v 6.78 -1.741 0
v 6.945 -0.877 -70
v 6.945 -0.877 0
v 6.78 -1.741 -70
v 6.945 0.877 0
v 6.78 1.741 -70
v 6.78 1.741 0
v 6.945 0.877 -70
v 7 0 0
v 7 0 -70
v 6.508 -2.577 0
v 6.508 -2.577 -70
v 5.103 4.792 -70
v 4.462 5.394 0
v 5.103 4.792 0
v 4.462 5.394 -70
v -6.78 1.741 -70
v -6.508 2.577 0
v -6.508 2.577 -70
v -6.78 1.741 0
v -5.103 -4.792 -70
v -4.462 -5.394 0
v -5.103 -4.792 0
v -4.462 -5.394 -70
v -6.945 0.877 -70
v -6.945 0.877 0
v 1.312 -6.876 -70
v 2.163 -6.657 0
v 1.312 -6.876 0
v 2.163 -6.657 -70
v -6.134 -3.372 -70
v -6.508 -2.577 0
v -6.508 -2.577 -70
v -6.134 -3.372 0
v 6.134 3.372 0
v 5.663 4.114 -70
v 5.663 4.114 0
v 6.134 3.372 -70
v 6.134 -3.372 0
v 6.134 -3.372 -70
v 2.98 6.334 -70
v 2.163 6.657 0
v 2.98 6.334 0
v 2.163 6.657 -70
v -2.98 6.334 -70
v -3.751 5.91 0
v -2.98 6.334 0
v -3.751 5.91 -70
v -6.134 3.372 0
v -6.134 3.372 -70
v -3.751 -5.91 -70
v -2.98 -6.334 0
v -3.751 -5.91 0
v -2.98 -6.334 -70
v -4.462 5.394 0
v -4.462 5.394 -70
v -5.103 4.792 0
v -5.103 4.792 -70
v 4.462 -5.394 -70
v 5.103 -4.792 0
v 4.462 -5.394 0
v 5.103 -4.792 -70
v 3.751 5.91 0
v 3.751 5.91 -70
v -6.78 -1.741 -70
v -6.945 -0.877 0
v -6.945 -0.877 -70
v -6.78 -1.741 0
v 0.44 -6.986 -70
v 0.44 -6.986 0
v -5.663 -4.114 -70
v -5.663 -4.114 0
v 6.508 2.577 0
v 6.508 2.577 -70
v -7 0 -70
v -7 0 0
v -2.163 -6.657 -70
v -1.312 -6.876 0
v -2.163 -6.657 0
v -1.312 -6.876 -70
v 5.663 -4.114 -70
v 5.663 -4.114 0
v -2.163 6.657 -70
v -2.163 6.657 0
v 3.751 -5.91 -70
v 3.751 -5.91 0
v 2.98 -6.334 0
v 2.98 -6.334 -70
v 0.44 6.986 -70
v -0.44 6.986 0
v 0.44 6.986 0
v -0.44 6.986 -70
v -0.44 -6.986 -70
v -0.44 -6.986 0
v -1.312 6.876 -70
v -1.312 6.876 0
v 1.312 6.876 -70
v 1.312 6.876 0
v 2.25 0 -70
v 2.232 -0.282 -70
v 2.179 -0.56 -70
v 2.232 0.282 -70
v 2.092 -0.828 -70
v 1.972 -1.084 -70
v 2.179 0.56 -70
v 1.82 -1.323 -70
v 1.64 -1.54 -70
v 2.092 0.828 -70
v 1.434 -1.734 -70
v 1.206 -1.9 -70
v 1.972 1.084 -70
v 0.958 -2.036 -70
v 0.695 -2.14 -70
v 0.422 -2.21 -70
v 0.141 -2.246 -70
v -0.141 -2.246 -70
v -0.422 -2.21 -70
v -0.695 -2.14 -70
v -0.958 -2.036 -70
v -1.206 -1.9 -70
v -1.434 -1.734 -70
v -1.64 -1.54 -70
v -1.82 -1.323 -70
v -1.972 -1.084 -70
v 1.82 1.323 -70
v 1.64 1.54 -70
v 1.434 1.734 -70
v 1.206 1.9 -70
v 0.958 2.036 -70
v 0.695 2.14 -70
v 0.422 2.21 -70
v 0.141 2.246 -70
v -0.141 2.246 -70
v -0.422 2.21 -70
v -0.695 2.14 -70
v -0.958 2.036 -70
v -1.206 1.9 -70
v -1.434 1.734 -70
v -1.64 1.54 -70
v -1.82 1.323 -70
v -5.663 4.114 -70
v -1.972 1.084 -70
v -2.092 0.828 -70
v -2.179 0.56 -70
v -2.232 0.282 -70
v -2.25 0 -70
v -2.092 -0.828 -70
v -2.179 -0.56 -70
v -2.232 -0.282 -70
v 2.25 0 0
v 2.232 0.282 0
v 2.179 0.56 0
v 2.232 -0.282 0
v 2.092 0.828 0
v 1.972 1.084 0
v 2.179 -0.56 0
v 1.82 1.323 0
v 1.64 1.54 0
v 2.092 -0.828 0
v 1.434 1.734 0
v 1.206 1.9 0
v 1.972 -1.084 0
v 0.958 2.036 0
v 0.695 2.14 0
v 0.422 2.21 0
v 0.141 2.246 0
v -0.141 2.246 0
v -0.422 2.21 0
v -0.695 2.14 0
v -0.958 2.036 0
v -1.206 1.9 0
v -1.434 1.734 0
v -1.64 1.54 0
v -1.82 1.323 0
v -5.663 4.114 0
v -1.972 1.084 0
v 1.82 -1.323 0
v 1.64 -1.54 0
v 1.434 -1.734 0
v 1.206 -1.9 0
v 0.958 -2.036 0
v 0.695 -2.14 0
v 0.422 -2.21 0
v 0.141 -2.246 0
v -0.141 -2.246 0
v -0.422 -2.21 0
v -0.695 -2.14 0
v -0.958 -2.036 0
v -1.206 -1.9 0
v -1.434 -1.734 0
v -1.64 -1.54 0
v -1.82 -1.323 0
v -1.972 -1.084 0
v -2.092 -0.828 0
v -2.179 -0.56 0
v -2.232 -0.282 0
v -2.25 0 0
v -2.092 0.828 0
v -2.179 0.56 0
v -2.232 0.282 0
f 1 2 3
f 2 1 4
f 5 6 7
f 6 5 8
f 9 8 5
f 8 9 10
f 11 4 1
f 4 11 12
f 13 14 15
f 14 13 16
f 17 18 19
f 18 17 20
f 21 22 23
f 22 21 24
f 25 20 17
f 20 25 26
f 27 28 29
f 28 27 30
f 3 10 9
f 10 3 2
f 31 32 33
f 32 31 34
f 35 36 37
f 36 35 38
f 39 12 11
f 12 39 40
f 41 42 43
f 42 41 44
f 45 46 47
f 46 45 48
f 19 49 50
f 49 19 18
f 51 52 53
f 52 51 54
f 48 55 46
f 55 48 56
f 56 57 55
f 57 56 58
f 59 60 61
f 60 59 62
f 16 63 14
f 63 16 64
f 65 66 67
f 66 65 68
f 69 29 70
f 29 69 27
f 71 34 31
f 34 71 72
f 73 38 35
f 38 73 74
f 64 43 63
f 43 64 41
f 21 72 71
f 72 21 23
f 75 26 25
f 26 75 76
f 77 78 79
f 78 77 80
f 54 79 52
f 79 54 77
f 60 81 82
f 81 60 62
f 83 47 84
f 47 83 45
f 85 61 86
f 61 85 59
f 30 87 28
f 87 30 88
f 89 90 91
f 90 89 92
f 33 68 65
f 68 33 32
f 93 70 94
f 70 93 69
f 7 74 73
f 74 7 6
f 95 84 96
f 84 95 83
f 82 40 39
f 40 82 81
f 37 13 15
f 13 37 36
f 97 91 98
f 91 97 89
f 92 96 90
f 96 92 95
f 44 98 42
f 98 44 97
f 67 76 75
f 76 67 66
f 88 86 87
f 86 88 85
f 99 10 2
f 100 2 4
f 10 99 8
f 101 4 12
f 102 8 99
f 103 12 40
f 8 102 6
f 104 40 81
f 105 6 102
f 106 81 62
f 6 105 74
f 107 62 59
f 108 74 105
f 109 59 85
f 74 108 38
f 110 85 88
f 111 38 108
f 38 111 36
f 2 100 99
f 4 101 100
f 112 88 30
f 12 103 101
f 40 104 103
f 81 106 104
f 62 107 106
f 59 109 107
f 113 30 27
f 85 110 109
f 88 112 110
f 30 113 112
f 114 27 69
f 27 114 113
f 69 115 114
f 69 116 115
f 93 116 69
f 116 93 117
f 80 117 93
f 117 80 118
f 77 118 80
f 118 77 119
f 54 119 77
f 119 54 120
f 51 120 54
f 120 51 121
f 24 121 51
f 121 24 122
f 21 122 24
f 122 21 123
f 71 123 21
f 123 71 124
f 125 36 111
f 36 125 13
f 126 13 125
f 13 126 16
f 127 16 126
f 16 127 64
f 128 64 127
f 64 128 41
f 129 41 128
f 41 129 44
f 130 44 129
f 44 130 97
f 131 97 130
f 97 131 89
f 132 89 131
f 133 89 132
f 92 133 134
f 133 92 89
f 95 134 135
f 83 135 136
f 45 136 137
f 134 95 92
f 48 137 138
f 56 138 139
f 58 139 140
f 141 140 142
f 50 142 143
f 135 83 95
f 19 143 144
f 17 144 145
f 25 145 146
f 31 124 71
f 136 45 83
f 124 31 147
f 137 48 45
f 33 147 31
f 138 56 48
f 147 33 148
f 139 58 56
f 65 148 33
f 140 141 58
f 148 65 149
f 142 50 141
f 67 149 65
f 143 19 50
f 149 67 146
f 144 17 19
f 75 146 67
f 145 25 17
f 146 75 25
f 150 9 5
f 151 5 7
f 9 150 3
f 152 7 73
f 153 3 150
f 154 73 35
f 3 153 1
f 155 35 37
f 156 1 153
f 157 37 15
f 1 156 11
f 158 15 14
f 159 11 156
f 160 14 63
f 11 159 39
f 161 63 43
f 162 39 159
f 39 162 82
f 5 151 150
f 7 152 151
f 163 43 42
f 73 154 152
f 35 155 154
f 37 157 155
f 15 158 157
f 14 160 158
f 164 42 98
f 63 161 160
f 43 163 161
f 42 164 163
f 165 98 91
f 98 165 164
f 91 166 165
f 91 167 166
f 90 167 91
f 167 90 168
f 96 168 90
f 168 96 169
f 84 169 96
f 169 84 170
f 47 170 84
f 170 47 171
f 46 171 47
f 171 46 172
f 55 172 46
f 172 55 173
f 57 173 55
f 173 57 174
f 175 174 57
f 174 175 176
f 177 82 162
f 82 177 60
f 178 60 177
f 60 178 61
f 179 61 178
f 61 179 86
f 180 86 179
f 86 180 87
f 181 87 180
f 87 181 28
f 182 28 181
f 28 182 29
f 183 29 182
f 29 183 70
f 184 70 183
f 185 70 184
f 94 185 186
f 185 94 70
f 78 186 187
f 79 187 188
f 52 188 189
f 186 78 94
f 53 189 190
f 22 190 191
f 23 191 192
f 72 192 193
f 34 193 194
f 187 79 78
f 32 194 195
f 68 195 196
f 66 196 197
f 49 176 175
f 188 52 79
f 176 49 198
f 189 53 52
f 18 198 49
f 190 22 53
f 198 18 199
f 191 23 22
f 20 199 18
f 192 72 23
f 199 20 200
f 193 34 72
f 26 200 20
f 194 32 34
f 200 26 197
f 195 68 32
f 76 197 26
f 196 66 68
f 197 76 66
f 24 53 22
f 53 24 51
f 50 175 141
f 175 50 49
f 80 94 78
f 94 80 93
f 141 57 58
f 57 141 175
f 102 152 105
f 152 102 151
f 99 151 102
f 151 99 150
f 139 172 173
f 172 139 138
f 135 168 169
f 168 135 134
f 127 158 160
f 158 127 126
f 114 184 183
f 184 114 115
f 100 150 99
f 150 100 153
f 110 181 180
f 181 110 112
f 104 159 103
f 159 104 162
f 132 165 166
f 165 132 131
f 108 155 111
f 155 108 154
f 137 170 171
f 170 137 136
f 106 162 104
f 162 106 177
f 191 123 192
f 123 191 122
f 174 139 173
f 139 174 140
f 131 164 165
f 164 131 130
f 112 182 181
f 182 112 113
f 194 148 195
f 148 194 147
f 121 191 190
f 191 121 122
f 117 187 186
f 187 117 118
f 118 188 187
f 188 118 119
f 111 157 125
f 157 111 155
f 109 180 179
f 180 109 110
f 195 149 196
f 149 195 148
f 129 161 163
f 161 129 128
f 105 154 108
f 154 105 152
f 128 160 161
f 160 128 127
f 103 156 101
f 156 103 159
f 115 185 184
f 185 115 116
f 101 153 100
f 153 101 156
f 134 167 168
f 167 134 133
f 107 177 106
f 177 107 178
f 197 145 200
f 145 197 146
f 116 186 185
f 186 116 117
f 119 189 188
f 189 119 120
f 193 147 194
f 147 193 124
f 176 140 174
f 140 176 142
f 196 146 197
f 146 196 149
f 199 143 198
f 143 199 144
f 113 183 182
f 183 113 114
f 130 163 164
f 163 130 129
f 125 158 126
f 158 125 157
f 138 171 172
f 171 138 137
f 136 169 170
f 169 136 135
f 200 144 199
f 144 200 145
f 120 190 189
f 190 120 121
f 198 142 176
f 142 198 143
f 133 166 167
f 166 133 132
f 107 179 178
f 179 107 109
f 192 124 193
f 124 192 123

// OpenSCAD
$fn = 50;


difference() {
	union() {
		translate(v = [0, 0, -70.0000000000]) {
			cylinder(h = 70, r = 7.0000000000);
		}
		cylinder(h = 0, r = 16.0000000000);
	}
	union() {
		#translate(v = [0, 0, -70]) {
			cylinder(h = 70, r = 2.2500000000);
		}
	}
}
